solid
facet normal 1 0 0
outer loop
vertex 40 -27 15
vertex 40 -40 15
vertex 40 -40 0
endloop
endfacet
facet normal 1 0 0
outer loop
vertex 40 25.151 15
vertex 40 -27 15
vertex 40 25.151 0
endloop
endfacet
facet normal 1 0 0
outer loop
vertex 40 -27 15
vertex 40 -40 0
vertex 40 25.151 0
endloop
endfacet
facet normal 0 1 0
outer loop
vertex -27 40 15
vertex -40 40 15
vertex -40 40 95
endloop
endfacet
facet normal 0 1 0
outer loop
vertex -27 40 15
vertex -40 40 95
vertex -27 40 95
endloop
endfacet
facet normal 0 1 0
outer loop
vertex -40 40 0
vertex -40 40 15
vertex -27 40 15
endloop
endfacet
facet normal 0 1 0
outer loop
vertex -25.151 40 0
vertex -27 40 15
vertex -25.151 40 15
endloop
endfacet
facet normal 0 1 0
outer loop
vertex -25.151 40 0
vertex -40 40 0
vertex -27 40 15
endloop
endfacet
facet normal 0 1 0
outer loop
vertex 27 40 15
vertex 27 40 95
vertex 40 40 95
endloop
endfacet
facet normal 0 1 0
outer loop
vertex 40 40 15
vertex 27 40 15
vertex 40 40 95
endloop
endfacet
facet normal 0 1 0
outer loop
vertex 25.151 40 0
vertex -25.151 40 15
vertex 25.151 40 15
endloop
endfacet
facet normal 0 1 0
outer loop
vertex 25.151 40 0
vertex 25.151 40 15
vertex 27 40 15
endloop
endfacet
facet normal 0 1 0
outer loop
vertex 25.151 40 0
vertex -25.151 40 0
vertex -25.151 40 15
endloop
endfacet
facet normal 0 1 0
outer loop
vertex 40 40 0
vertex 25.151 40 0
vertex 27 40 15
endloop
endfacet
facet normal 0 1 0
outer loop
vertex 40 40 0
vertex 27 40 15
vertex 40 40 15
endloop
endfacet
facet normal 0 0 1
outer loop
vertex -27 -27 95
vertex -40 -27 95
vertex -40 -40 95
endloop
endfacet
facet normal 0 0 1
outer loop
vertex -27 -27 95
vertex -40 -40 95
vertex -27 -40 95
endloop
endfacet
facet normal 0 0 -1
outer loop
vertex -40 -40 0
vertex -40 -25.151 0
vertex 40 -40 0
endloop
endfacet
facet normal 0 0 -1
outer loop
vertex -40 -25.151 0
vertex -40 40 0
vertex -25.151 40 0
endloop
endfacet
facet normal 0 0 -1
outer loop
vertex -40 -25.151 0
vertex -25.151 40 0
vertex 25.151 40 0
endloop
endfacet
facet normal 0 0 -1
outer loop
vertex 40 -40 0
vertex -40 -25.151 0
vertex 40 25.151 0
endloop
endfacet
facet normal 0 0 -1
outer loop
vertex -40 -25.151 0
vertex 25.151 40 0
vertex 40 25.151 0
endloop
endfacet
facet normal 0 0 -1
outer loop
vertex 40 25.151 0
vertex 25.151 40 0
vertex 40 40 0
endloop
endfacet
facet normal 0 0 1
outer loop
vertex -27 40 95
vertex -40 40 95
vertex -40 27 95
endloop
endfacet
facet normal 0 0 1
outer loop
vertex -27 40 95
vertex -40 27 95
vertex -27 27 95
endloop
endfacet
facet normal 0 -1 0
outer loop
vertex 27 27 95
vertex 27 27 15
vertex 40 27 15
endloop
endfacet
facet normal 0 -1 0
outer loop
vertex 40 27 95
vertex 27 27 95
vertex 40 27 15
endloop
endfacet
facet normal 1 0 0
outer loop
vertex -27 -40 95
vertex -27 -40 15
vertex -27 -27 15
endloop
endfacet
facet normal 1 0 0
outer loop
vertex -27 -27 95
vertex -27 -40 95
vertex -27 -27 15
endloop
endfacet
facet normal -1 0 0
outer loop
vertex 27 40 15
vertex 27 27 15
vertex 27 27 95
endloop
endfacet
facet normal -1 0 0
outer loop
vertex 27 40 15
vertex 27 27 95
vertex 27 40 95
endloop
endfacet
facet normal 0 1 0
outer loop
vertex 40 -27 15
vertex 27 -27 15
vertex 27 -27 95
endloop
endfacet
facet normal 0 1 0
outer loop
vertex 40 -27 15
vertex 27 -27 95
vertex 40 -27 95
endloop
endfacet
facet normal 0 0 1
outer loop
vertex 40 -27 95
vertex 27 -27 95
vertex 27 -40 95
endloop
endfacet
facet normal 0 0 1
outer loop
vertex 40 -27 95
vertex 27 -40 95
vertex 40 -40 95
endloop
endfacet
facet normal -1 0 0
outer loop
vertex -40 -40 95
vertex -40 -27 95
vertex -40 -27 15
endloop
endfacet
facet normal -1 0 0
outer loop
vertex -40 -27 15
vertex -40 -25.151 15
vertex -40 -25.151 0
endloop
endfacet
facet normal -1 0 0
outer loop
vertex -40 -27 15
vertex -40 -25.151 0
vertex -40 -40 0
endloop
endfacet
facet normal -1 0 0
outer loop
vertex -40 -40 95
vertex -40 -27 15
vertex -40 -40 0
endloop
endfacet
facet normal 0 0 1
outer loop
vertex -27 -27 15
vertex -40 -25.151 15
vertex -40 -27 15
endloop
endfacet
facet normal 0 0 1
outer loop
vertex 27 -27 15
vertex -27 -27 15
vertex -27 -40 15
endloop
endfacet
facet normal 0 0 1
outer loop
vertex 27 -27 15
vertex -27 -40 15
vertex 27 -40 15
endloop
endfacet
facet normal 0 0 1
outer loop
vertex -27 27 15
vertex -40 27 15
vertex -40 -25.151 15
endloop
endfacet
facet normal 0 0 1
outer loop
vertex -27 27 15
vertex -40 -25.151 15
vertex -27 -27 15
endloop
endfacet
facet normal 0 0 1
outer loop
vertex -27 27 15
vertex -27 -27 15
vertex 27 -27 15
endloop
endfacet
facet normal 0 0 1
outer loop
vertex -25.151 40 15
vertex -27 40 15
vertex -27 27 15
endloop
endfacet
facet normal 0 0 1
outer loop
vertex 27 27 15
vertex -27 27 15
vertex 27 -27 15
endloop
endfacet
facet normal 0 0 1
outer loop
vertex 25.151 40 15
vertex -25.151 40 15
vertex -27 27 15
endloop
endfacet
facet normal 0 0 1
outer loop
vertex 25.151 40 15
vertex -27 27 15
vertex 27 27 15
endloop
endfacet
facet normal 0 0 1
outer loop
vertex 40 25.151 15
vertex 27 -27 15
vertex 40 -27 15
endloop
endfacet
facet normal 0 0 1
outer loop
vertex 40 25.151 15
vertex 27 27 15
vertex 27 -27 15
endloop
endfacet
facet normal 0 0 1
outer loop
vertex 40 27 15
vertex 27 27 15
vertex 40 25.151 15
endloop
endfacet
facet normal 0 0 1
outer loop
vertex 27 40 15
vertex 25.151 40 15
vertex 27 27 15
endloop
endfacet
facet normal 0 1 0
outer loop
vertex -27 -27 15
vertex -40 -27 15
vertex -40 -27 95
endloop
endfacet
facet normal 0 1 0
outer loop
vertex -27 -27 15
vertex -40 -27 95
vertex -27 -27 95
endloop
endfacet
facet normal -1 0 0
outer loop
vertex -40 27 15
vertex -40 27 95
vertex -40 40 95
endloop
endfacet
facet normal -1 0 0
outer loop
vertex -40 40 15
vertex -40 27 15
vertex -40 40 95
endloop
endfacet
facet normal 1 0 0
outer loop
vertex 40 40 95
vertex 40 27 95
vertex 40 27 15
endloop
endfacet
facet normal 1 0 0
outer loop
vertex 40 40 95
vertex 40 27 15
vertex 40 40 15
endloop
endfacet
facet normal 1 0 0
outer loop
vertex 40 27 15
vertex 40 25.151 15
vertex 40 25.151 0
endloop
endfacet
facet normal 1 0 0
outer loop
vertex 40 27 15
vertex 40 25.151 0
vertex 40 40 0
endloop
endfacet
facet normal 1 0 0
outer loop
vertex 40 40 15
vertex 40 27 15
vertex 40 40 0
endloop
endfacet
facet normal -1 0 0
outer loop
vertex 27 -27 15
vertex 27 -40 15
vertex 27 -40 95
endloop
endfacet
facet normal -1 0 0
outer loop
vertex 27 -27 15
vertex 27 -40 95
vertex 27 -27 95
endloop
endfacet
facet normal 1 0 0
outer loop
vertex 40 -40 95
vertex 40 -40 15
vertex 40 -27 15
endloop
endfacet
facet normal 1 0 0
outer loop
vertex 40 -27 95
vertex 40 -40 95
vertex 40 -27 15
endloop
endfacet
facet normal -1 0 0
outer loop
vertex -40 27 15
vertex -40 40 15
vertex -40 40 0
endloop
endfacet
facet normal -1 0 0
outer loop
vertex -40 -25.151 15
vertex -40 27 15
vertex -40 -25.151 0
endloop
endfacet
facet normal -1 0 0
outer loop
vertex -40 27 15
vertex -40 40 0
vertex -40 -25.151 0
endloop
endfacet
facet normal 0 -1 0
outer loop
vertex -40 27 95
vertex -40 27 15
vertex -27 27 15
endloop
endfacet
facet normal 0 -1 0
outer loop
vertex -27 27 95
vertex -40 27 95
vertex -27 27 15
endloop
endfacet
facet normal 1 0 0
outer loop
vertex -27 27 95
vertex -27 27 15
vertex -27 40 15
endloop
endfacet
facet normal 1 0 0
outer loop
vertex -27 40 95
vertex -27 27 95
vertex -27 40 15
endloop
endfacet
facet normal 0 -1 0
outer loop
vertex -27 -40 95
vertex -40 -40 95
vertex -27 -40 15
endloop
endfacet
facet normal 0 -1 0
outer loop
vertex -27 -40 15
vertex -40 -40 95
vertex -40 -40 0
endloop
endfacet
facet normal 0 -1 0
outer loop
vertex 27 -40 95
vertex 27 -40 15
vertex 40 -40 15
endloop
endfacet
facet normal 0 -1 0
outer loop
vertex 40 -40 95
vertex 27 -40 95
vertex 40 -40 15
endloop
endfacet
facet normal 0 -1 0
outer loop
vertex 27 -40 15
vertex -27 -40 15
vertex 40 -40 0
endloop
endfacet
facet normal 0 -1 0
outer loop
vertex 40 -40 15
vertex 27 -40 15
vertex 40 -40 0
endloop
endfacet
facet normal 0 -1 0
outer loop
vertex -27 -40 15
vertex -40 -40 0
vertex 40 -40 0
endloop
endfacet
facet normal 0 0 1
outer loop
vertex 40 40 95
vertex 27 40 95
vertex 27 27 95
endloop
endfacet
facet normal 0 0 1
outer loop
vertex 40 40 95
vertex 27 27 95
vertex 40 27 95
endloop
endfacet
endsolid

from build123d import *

# Parameters (mm, degrees)
SKETCH_1_W      = 14.849242405
SKETCH_1_H      = 14.849242405
EXTRUDE_6_DEPTH = 15
SKETCH_4_W      = 13
SKETCH_4_H      = 13
EXTRUDE_7_DEPTH = 80


with BuildPart() as part:
    # 草图1 → 凸台-拉伸6 (new body)
    with BuildSketch(Plane.XY):
        with Locations((-32.575378798, 32.575378798)):
            Rectangle(SKETCH_1_W, SKETCH_1_H)
        Polygon((25.150757595, 40), (-25.150757595, 40), (-25.150757595, 25.150757595), (-40, 25.150757595), (-40, -25.150757595), (-25.150757595, -25.150757595), (-25.150757595, -40), (25.150757595, -40), (25.150757595, -25.150757595), (40, -25.150757595), (40, 25.150757595), (25.150757595, 25.150757595), align=None)
        with Locations((32.575378798, 32.575378798)):
            Rectangle(SKETCH_1_W, SKETCH_1_H)
        Polygon((40, -39.62158524), (40, -25.150757595), (25.150757595, -25.150757595), (25.150757595, -40), (39.62158524, -40), (40, -40), align=None)
        Polygon((-25.150757595, -25.150757595), (-40, -25.150757595), (-40, -40), (-25.902864758, -40), (-25.150757595, -40), align=None)
    extrude(amount=EXTRUDE_6_DEPTH)

    # 草图4 → 凸台-拉伸7 (add)
    with BuildSketch(Plane.XY.offset(15)):
        with Locations((-33.5, 33.5)):
            Rectangle(SKETCH_4_W, SKETCH_4_H)
        with Locations((33.5, 33.5)):
            Rectangle(SKETCH_4_W, SKETCH_4_H)
        with Locations((-33.5, -33.5)):
            Rectangle(SKETCH_4_W, SKETCH_4_H)
        with Locations((33.5, -33.5)):
            Rectangle(SKETCH_4_W, SKETCH_4_H)
    extrude(amount=EXTRUDE_7_DEPTH)


solid = part.part
